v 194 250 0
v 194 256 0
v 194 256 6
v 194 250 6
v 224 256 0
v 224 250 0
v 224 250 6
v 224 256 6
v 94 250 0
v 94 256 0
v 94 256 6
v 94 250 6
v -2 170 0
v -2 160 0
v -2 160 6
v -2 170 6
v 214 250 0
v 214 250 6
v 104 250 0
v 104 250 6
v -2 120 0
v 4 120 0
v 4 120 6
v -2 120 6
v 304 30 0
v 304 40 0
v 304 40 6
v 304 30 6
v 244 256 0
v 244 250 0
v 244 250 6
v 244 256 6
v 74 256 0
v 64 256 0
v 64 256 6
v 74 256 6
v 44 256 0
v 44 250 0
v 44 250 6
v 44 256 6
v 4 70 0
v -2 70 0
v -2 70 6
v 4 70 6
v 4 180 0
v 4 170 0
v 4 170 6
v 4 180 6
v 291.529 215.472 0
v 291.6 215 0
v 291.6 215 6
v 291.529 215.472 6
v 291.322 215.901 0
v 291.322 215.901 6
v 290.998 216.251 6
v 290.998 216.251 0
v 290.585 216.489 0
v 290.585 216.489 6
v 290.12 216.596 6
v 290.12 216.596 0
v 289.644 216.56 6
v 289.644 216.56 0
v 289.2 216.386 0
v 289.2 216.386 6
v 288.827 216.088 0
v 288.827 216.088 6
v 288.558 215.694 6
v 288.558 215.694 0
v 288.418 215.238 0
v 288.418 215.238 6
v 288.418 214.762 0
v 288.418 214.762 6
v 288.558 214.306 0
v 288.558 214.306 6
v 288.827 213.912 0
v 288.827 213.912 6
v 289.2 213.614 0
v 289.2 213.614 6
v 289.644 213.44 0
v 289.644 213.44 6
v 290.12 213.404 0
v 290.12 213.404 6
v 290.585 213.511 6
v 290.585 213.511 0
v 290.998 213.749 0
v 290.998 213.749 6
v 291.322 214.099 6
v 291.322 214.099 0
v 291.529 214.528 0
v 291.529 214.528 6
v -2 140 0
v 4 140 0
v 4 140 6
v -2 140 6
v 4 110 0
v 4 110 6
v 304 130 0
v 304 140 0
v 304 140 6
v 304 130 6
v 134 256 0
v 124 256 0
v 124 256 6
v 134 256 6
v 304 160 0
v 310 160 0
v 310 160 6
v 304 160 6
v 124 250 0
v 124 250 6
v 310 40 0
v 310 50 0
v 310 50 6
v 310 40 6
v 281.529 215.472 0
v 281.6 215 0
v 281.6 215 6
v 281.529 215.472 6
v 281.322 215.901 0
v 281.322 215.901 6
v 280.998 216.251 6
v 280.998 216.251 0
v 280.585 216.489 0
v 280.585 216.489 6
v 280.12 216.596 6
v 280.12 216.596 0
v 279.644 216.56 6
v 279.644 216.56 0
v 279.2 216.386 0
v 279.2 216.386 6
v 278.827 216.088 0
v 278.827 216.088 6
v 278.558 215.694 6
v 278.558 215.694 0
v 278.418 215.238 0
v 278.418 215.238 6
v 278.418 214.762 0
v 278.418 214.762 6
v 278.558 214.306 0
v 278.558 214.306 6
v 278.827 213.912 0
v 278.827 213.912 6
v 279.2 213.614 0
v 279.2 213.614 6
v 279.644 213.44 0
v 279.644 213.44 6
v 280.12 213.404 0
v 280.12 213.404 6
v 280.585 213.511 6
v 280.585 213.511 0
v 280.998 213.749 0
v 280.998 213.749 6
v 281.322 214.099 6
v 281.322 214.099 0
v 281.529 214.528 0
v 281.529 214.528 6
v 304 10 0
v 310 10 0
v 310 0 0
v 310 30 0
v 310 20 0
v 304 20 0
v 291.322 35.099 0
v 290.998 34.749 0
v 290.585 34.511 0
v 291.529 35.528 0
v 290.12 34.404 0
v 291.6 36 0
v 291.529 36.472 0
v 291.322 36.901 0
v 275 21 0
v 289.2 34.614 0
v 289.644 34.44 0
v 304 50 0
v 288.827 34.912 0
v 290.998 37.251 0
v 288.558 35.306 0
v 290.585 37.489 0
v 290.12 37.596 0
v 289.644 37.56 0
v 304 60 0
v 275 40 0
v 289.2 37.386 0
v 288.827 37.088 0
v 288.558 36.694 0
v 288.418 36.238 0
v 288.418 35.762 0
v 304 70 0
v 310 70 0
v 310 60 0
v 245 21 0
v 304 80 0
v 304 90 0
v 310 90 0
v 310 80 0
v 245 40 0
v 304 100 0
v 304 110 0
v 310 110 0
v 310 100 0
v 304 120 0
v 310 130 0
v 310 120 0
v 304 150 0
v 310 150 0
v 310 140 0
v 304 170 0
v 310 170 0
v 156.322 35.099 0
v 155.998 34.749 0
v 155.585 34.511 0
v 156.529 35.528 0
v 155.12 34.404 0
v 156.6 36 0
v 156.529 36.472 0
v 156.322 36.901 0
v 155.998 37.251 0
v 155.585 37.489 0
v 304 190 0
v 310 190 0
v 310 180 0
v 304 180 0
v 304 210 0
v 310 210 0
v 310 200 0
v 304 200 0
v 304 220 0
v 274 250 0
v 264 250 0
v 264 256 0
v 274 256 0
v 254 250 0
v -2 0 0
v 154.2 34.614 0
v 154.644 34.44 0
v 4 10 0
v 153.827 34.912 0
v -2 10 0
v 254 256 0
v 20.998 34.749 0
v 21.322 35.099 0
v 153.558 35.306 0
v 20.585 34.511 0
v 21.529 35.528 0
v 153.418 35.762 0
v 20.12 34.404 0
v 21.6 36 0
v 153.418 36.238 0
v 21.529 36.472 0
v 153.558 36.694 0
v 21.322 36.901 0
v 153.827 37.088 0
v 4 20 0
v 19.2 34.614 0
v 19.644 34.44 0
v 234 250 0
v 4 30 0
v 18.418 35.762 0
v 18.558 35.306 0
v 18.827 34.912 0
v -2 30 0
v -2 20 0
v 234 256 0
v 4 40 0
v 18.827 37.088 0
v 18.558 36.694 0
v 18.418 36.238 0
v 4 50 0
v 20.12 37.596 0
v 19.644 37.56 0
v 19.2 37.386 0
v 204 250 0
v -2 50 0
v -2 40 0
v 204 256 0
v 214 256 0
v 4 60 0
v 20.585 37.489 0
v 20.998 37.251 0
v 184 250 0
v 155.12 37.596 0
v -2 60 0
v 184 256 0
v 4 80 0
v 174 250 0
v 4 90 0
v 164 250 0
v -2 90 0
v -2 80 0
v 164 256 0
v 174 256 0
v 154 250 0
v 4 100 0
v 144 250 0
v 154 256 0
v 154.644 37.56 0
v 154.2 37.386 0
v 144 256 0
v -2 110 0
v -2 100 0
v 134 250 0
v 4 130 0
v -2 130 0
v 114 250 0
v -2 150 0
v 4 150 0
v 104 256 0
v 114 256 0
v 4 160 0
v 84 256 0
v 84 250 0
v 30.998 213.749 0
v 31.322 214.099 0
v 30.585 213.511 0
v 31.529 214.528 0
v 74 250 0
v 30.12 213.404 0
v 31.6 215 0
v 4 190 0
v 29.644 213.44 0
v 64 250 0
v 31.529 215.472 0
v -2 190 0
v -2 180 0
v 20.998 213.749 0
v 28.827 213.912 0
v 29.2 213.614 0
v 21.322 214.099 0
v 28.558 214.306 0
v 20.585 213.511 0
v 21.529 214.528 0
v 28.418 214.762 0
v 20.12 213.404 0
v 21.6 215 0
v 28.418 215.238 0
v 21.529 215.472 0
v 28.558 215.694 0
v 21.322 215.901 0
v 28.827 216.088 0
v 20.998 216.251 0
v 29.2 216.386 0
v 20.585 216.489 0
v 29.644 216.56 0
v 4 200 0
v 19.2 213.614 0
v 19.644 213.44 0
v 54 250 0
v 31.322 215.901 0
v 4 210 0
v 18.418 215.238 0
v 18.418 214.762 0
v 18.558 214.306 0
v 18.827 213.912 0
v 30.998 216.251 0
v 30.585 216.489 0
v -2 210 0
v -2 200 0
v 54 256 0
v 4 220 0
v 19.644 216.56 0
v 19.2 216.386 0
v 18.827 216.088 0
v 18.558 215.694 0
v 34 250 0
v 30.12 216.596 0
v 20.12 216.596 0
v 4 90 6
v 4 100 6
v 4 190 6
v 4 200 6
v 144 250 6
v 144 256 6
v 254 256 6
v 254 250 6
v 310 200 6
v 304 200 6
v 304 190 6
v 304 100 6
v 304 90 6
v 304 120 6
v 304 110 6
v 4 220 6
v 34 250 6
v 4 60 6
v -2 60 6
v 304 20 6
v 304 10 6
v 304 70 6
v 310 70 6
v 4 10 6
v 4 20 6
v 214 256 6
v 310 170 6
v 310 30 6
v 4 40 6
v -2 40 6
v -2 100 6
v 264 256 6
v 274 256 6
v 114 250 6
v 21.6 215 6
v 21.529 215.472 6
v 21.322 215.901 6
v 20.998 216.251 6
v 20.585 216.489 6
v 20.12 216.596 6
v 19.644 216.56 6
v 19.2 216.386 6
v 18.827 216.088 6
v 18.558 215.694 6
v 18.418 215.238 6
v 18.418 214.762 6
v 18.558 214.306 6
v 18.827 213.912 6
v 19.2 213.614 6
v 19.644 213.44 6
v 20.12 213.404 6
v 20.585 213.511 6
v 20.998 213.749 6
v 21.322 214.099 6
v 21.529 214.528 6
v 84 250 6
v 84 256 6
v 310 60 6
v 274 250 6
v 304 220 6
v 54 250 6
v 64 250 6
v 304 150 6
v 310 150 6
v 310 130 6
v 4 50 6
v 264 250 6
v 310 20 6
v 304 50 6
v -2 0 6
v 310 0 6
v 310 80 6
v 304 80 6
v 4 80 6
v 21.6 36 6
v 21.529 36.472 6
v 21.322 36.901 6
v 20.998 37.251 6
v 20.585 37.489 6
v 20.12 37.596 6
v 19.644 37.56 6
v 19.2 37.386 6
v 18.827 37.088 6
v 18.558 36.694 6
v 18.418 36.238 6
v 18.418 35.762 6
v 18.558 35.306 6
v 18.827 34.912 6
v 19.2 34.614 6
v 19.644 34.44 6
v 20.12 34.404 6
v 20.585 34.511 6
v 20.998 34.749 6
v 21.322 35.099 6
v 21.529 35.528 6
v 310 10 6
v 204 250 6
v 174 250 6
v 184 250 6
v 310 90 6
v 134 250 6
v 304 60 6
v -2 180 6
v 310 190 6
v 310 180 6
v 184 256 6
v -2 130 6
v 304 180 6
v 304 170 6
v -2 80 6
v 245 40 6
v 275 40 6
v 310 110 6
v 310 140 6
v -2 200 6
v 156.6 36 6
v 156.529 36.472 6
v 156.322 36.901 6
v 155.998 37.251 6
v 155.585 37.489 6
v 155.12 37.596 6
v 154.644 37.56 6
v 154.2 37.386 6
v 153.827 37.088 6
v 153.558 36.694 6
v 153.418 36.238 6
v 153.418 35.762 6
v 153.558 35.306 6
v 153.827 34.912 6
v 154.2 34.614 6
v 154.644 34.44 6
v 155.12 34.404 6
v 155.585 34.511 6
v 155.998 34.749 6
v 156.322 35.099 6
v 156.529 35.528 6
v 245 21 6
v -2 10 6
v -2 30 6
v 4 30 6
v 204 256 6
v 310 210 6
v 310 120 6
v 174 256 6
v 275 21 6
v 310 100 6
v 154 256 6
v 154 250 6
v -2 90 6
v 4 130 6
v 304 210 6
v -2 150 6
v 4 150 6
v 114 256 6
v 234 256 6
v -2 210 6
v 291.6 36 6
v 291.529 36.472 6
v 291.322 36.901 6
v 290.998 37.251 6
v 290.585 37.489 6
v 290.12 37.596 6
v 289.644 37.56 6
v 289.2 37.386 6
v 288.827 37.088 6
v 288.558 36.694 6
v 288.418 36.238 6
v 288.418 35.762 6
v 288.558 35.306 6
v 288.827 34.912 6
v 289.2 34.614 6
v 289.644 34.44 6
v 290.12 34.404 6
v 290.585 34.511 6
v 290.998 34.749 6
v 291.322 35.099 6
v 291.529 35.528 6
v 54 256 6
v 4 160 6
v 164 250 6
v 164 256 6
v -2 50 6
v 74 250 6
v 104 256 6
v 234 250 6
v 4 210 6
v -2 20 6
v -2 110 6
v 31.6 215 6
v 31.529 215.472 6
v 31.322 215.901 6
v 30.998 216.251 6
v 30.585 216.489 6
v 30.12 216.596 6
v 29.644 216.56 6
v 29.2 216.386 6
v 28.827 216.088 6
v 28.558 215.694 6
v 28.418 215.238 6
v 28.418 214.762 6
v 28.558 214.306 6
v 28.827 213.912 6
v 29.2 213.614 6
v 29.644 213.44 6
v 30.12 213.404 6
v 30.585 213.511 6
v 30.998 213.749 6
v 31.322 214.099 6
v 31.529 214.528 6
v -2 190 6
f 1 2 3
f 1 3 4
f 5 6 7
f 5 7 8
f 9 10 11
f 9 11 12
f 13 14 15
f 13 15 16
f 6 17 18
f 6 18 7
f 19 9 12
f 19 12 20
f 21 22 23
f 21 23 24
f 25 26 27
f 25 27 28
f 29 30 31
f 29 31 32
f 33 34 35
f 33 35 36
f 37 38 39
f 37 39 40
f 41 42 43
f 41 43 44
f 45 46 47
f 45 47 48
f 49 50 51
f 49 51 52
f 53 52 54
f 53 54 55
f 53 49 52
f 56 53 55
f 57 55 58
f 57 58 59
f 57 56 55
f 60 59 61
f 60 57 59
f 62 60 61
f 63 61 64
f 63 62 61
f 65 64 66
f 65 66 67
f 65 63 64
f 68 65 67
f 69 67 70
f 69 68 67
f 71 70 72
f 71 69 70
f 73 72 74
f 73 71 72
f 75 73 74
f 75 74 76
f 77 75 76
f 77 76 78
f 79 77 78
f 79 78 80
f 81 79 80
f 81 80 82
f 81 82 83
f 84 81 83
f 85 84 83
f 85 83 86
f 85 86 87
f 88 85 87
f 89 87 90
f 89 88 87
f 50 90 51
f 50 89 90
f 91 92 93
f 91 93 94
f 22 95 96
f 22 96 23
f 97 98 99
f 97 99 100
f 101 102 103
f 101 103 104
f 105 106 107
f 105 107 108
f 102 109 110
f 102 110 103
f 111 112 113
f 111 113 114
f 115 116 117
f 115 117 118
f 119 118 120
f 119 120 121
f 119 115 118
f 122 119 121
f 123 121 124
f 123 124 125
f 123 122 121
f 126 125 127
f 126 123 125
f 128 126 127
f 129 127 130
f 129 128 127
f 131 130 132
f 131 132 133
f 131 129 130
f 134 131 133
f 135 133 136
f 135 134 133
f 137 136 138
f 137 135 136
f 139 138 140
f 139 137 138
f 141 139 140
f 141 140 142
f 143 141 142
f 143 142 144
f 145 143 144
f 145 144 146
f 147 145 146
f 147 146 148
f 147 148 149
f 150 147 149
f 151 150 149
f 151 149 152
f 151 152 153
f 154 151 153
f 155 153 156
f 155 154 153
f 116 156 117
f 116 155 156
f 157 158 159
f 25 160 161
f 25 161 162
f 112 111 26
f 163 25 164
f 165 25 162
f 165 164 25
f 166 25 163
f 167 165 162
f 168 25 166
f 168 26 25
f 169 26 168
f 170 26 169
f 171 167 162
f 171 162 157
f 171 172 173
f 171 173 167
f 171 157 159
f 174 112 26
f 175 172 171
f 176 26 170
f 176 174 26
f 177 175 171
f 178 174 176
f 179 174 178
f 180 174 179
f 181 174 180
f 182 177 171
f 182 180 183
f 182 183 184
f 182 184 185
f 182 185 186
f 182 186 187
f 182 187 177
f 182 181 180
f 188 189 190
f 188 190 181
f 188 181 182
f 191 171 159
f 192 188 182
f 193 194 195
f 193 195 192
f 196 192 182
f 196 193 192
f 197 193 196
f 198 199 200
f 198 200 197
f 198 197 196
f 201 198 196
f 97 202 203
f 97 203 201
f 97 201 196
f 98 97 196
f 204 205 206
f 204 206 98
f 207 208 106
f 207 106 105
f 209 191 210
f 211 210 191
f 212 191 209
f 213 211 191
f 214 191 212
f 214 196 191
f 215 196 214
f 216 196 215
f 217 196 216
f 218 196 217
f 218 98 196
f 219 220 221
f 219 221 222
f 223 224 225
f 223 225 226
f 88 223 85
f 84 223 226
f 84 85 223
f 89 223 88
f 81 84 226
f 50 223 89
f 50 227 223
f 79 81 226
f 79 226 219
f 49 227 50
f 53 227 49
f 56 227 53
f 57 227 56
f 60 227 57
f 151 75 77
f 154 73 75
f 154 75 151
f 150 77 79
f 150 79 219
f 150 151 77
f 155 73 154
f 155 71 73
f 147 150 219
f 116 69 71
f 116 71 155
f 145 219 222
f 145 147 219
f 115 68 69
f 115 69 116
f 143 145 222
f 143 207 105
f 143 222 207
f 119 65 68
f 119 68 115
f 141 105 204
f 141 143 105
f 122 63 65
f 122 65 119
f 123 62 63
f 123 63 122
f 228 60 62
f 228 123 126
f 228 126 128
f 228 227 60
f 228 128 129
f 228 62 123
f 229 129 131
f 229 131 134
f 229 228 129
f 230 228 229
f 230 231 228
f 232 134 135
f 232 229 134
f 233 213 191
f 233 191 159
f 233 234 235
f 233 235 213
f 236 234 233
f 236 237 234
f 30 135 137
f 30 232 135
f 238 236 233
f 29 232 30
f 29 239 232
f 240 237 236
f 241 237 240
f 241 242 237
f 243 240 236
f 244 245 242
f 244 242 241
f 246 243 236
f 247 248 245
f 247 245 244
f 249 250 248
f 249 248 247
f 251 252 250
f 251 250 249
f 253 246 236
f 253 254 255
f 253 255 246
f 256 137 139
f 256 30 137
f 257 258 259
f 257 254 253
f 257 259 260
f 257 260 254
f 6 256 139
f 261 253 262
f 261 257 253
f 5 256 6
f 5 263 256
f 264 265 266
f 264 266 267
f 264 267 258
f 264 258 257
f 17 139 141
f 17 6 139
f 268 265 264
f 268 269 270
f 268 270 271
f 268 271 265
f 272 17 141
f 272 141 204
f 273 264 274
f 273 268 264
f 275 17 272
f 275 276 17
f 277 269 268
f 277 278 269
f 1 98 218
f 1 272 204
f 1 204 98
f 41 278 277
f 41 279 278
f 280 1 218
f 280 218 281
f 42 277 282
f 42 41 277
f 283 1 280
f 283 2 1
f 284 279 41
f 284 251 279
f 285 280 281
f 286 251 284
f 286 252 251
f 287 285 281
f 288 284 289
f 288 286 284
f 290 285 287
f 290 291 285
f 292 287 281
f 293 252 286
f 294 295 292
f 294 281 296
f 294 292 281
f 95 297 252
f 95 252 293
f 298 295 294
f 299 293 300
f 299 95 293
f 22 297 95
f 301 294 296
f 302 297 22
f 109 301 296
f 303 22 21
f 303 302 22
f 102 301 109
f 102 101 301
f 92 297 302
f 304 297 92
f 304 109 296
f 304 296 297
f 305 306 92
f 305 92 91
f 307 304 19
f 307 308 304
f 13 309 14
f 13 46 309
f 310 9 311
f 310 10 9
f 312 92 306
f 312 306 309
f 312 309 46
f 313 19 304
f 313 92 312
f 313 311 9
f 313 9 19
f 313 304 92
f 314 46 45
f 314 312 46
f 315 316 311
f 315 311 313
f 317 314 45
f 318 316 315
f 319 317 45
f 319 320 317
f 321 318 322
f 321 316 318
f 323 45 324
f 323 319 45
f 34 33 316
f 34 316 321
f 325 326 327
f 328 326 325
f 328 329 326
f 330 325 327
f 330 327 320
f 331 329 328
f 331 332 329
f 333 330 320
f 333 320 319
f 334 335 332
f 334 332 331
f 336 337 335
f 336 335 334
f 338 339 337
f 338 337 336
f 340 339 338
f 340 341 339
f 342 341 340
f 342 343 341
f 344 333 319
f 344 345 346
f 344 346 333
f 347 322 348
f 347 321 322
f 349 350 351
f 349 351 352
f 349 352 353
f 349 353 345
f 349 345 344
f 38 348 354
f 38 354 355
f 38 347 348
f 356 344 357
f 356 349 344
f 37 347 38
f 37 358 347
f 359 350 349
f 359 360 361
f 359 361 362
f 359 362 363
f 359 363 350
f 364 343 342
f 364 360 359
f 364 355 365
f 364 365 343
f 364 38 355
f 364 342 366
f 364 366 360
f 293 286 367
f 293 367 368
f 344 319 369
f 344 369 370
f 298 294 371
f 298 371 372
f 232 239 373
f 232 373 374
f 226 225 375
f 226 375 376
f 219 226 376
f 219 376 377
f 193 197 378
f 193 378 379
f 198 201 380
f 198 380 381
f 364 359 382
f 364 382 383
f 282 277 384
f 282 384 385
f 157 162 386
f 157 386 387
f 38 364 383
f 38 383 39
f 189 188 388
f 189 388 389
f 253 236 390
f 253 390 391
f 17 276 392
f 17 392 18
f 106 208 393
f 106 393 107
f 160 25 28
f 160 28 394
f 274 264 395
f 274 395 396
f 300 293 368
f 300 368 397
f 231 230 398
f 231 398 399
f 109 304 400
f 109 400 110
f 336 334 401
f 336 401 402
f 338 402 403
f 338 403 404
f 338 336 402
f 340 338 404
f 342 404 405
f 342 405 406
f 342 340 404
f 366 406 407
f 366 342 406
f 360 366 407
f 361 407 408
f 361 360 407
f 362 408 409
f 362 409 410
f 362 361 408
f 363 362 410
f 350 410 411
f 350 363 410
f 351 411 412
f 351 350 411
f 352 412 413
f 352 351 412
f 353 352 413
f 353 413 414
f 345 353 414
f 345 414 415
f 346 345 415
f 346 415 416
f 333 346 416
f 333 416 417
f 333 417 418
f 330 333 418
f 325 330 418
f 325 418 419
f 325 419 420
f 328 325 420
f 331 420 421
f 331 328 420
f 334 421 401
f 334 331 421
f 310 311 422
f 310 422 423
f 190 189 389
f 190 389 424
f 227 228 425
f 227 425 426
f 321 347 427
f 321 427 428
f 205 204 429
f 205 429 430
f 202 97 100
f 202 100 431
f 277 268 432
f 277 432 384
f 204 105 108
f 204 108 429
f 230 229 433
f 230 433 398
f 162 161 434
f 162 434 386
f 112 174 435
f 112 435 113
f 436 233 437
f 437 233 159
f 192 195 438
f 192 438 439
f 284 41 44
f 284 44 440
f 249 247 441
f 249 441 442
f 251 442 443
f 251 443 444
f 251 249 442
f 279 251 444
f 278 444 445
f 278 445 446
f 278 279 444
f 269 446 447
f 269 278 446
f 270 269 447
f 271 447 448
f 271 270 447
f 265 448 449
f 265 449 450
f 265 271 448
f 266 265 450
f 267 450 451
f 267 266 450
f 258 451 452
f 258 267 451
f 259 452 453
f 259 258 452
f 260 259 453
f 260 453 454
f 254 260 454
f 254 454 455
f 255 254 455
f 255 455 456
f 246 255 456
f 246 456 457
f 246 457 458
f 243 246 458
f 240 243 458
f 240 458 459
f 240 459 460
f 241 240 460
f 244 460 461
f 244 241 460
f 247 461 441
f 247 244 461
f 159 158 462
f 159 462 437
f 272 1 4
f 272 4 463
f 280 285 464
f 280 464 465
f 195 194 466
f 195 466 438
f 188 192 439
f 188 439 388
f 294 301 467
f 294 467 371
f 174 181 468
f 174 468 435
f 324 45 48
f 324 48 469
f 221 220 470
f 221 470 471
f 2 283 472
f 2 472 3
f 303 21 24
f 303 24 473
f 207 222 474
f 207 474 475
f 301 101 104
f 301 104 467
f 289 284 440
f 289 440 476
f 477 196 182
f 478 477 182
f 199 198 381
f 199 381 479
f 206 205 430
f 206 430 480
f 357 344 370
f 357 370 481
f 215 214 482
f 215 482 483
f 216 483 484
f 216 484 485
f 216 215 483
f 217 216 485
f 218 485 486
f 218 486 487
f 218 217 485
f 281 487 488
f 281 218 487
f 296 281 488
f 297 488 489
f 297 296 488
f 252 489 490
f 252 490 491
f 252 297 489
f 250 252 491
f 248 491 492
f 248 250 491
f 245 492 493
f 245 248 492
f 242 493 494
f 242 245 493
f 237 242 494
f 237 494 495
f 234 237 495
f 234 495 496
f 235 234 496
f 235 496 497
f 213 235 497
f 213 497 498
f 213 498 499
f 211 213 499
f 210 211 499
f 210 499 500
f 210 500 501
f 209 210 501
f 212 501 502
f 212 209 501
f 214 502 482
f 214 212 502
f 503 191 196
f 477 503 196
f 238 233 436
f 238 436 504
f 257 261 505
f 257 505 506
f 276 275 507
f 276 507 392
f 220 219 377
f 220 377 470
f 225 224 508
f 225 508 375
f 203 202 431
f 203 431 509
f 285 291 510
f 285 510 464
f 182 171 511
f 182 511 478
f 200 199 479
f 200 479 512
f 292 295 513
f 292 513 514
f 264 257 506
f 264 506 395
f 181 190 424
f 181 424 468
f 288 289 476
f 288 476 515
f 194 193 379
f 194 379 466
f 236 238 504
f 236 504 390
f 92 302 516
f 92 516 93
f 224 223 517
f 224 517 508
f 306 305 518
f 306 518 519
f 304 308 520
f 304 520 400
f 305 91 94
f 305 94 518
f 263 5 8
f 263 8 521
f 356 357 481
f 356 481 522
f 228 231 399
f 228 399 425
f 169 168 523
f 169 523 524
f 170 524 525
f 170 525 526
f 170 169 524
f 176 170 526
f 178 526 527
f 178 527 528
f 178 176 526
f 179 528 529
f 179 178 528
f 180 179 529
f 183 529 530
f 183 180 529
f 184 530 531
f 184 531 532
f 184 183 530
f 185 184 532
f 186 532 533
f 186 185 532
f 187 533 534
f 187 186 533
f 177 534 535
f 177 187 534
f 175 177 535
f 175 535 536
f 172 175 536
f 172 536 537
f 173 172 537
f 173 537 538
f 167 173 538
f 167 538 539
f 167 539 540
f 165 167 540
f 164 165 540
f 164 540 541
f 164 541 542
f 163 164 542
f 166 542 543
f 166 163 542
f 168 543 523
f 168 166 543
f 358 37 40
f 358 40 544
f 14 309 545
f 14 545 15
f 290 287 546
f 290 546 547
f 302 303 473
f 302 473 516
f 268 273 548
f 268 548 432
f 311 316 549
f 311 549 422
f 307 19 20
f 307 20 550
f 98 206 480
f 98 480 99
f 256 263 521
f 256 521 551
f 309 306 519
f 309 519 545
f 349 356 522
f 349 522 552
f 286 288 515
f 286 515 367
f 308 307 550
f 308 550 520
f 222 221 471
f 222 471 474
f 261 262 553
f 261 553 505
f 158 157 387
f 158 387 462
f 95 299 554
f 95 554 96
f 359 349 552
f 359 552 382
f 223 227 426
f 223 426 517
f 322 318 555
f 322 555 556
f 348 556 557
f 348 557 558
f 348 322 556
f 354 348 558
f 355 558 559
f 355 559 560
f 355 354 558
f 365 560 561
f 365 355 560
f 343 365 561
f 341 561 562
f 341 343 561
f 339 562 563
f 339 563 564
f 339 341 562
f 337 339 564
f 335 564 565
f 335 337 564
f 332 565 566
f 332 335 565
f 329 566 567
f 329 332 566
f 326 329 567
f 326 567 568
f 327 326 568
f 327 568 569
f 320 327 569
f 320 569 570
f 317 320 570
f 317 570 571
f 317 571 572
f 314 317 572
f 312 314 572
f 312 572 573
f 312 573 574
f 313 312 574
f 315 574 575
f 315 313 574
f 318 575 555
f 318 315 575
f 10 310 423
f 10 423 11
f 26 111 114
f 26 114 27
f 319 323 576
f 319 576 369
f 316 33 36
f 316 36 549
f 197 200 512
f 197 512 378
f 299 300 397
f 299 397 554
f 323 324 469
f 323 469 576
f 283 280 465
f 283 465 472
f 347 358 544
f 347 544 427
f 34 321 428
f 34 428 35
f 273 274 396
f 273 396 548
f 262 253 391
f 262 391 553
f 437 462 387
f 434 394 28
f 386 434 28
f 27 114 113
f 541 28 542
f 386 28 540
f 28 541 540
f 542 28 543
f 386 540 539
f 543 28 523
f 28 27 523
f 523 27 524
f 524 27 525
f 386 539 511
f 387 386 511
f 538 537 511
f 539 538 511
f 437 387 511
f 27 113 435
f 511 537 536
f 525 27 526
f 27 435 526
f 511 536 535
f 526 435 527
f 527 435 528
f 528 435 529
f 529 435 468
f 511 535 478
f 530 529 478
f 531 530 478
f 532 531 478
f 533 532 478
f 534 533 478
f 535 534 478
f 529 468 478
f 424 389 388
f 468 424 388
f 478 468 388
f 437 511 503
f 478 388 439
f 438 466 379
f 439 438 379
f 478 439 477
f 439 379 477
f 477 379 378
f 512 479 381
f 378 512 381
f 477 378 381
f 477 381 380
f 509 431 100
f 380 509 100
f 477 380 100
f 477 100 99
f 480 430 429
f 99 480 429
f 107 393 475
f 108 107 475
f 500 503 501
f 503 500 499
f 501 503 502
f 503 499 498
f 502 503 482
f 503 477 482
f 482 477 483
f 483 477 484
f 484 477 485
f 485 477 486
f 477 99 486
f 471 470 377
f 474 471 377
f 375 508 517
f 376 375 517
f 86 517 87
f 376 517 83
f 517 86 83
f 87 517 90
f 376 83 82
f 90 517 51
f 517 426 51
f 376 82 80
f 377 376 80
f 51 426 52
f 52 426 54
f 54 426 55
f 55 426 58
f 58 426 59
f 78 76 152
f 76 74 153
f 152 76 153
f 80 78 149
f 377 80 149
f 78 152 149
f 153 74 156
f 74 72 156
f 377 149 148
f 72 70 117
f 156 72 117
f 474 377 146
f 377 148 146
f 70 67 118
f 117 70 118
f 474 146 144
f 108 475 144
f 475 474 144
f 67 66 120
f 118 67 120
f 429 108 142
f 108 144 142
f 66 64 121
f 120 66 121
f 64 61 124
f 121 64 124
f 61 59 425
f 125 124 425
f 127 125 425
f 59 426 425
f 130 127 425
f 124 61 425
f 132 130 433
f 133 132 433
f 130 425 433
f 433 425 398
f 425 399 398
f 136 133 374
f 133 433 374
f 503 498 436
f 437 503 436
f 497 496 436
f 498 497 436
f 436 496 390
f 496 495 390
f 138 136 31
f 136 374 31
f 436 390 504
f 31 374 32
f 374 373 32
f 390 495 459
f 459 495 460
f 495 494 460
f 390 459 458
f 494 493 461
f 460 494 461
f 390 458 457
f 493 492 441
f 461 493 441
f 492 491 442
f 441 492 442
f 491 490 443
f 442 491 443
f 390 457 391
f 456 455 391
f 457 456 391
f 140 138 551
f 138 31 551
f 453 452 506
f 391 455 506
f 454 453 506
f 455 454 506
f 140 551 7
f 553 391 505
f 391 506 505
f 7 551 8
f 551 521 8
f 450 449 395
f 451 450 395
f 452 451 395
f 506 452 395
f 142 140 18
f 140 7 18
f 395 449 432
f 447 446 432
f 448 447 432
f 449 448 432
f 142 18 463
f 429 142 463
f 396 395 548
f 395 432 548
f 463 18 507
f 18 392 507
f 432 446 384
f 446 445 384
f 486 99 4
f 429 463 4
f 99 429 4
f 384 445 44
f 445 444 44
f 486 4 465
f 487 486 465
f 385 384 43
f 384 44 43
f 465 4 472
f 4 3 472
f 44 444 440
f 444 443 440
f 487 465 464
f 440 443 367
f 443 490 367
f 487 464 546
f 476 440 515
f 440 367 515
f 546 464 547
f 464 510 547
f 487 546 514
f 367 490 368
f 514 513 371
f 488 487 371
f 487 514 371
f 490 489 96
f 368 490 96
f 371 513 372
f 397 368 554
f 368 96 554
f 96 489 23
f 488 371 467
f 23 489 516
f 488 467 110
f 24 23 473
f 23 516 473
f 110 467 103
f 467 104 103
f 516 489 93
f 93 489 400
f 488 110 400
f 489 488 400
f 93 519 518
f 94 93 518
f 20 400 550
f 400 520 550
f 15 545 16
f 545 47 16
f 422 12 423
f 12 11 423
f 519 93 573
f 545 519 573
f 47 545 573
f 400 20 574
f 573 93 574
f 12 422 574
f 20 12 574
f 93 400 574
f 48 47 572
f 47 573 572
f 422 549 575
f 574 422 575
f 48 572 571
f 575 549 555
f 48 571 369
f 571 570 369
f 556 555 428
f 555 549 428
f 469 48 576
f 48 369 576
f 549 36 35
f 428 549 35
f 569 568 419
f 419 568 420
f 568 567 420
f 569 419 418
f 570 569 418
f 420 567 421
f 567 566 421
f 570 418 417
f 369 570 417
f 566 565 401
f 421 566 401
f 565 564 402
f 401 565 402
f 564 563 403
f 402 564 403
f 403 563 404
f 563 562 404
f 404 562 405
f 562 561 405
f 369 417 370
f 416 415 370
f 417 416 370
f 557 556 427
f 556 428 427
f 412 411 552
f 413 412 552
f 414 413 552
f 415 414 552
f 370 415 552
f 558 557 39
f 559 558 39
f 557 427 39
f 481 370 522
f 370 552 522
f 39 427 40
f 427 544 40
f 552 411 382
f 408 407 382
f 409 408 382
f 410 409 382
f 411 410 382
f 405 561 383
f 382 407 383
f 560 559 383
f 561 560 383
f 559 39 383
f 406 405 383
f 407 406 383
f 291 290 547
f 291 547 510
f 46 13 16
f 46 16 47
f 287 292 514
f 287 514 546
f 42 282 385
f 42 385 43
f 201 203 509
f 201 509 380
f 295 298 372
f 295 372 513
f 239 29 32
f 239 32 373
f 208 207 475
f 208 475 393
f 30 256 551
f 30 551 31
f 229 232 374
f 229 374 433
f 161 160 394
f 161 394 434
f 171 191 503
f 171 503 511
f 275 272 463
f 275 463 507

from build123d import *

# Parameters (mm, degrees)
SKIZZE1_R                       = 1.6
SKIZZE1_W                       = 30
SKIZZE1_H                       = 19
AUFSATZ_LINEAR_AUSTRAGEN1_DEPTH = 6


with BuildPart() as part:
    # Skizze1 → Aufsatz-Linear austragen1 (new body)
    with BuildSketch(Plane.XY):
        Polygon((4, 10), (4, 20), (-2, 20), (-2, 30), (4, 30), (4, 40), (-2, 40), (-2, 50), (4, 50), (4, 60), (-2, 60), (-2, 70), (4, 70), (4, 80), (-2, 80), (-2, 90), (4, 90), (4, 100), (-2, 100), (-2, 110), (4, 110), (4, 120), (-2, 120), (-2, 130), (4, 130), (4, 140), (-2, 140), (-2, 150), (4, 150), (4, 160), (-2, 160), (-2, 170), (4, 170), (4, 180), (-2, 180), (-2, 190), (4, 190), (4, 200), (-2, 200), (-2, 210), (4, 210), (4, 220), (34, 250), (44, 250), (44, 256), (54, 256), (54, 250), (64, 250), (64, 256), (74, 256), (74, 250), (84, 250), (84, 256), (94, 256), (94, 250), (104, 250), (104, 256), (114, 256), (114, 250), (124, 250), (124, 256), (134, 256), (134, 250), (144, 250), (144, 256), (154, 256), (154, 250), (164, 250), (164, 256), (174, 256), (174, 250), (184, 250), (184, 256), (194, 256), (194, 250), (204, 250), (204, 256), (214, 256), (214, 250), (224, 250), (224, 256), (234, 256), (234, 250), (244, 250), (244, 256), (254, 256), (254, 250), (264, 250), (264, 256), (274, 256), (274, 250), (304, 220), (304, 210), (310, 210), (310, 200), (304, 200), (304, 190), (310, 190), (310, 180), (304, 180), (304, 170), (310, 170), (310, 160), (304, 160), (304, 150), (310, 150), (310, 140), (304, 140), (304, 130), (310, 130), (310, 120), (304, 120), (304, 110), (310, 110), (310, 100), (304, 100), (304, 90), (310, 90), (310, 80), (304, 80), (304, 70), (310, 70), (310, 60), (304, 60), (304, 50), (310, 50), (310, 40), (304, 40), (304, 30), (310, 30), (310, 20), (304, 20), (304, 10), (310, 10), (310, 0), (304, 0), (4, 0), (-2, 0), (-2, 10), align=None)
        with Locations((20, 215)):
            Circle(SKIZZE1_R, mode=Mode.SUBTRACT)
        with Locations((30, 215)):
            Circle(SKIZZE1_R, mode=Mode.SUBTRACT)
        with Locations((290, 215)):
            Circle(SKIZZE1_R, mode=Mode.SUBTRACT)
        with Locations((280, 215)):
            Circle(SKIZZE1_R, mode=Mode.SUBTRACT)
        with Locations((20, 36)):
            Circle(SKIZZE1_R, mode=Mode.SUBTRACT)
        with Locations((155, 36)):
            Circle(SKIZZE1_R, mode=Mode.SUBTRACT)
        with Locations((290, 36)):
            Circle(SKIZZE1_R, mode=Mode.SUBTRACT)
        with Locations((260, 30.5)):
            Rectangle(SKIZZE1_W, SKIZZE1_H, mode=Mode.SUBTRACT)
    extrude(amount=AUFSATZ_LINEAR_AUSTRAGEN1_DEPTH)


solid = part.part
